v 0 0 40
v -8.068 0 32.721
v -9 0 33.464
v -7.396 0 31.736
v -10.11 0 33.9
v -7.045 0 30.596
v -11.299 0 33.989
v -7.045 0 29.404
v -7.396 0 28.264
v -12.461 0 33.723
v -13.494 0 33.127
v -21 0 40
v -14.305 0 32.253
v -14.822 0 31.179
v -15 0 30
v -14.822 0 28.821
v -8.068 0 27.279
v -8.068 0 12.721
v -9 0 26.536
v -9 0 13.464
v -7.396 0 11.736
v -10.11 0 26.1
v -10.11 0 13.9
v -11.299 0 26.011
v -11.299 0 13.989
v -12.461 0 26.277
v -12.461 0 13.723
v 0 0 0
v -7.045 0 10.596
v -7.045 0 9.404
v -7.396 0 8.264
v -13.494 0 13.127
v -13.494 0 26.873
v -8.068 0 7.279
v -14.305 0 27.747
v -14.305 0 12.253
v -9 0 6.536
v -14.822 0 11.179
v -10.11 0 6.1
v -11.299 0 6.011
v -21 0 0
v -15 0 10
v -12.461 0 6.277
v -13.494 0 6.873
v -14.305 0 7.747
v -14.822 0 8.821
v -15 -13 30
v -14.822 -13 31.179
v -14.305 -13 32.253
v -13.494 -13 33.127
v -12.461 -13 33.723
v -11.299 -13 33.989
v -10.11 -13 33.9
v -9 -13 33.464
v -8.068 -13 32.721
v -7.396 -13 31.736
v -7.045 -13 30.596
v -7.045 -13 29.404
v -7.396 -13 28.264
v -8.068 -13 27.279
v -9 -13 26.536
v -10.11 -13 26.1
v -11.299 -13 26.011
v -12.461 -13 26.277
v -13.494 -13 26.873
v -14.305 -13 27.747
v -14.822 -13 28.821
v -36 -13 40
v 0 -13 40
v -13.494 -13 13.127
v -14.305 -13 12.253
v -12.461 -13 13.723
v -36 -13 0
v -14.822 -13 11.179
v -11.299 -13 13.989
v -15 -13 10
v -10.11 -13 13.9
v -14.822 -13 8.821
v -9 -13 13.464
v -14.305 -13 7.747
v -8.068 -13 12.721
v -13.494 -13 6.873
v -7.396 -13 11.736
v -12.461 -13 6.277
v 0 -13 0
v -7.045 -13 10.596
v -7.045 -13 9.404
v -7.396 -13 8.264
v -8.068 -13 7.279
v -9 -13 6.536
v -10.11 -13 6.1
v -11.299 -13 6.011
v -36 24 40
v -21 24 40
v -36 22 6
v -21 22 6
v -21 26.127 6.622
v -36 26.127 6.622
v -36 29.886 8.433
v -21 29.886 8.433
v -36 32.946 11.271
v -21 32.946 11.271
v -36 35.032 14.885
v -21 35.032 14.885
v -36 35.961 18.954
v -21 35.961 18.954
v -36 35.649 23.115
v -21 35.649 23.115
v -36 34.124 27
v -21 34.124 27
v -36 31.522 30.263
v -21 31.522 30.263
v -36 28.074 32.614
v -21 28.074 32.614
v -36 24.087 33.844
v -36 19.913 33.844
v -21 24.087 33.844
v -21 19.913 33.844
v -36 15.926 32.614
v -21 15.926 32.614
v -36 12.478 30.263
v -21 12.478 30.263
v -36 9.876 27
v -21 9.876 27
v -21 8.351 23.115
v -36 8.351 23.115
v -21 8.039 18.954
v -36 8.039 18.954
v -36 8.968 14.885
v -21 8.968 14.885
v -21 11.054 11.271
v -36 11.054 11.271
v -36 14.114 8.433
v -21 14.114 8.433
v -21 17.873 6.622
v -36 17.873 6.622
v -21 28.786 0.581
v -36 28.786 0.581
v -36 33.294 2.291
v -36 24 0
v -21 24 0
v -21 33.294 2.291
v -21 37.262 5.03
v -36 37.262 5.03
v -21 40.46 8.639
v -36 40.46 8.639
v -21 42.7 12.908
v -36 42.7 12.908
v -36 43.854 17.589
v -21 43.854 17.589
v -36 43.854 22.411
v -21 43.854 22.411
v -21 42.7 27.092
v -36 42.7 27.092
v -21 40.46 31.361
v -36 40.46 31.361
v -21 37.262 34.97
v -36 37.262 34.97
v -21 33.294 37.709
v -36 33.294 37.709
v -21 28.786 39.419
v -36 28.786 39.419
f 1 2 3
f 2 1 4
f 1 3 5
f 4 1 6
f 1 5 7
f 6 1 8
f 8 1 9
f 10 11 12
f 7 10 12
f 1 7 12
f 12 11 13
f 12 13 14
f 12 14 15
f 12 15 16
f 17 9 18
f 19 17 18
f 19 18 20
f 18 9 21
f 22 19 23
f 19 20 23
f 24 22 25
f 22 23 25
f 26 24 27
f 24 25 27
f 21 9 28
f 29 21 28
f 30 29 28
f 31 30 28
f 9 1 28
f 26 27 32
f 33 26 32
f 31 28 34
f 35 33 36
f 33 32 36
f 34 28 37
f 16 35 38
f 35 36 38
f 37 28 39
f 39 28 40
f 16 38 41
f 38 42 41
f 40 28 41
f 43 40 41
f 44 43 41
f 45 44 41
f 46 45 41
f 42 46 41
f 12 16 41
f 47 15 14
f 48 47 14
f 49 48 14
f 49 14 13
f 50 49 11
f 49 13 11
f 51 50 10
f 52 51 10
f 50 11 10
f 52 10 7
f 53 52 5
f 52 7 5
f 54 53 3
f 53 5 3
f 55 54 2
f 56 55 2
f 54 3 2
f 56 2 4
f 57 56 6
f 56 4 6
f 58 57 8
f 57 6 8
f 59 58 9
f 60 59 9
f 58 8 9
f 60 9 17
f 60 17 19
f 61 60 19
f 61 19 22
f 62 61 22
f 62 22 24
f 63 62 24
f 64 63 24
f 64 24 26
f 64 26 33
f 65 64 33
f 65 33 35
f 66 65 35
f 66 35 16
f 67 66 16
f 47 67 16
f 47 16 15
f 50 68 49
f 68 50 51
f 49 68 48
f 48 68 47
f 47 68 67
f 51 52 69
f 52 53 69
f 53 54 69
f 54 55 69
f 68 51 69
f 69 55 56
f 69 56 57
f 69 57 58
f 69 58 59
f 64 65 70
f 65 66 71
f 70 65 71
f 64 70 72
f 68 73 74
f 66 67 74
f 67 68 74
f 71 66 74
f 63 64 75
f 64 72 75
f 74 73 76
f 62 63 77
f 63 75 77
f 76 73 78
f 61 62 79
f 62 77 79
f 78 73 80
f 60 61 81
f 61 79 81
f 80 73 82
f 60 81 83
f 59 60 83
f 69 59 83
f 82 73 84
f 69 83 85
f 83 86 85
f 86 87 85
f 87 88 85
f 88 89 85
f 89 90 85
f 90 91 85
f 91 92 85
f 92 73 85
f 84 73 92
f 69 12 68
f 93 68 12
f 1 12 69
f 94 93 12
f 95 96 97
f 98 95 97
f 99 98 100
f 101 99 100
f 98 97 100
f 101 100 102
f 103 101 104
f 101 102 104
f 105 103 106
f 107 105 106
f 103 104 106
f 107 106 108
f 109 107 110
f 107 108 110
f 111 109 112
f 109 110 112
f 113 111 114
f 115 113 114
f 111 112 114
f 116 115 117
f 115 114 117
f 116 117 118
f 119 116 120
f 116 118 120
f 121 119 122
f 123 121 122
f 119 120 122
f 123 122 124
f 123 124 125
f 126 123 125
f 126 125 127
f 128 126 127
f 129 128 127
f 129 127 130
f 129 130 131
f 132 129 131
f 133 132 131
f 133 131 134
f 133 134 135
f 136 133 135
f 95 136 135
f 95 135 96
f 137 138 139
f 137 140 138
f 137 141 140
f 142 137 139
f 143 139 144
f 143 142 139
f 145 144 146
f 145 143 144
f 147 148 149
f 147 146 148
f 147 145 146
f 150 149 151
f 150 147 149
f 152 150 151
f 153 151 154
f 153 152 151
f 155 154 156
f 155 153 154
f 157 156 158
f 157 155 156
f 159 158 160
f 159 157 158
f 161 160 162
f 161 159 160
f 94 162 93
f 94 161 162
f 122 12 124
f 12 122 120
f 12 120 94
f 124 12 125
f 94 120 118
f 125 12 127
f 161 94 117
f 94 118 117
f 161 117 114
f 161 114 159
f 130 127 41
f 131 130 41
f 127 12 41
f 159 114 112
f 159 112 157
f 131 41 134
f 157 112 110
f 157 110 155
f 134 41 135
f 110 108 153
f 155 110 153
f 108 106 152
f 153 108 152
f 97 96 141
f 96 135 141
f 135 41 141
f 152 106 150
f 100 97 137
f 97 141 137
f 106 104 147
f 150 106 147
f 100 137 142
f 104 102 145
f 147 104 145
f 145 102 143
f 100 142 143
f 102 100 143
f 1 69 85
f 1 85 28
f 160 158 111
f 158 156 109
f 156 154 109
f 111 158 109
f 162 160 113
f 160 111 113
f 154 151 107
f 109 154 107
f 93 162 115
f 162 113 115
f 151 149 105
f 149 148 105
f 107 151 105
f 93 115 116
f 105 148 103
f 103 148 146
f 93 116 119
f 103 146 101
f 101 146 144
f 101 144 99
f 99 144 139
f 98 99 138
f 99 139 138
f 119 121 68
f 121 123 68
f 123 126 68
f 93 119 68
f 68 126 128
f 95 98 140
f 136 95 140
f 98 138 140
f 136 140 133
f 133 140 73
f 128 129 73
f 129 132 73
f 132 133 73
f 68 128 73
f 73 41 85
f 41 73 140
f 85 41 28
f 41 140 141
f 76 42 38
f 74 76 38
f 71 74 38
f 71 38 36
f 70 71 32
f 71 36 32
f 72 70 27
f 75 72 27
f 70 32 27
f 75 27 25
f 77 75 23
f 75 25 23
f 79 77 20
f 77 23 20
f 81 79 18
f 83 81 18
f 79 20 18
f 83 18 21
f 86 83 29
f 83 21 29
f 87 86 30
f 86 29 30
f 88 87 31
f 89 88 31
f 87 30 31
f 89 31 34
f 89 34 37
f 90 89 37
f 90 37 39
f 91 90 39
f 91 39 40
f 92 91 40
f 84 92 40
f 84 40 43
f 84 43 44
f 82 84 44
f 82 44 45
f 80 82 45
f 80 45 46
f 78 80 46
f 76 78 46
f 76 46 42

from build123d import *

# Parameters (mm, degrees)
BOSS_EXTRUDE5_DEPTH = 40
FILLET4_RADIUS      = 20
FILLET4_LENGTH      = 15
SKETCH8_R           = 14
CUT_EXTRUDE1_DEPTH  = 40
SKETCH9_R           = 4
CUT_EXTRUDE2_DEPTH  = 40


with BuildPart() as part:
    # Sketch1 → Boss-Extrude5 (new body)
    with BuildSketch(Plane.XY):
        Polygon((-36, 44), (-36, -13), (0, -13), (0, 0), (-21, 0), (-21, 44), align=None)
    extrude(amount=BOSS_EXTRUDE5_DEPTH)

    # Fillet4: full round fillet: the end face becomes a half cylinder, R = half its width
    fillet4_face = Plane((-28.5, 44, 20), x_dir=(1, 0, 0), z_dir=(0, 1, 0))  # on the end face: x along it, z out of the body
    fillet4_slab = fillet4_face.offset(-FILLET4_RADIUS / 2) * Box(FILLET4_LENGTH, 2 * FILLET4_RADIUS, FILLET4_RADIUS, mode=Mode.PRIVATE)  # the body's end, R deep
    fillet4_round = Plane((-28.5, 24, 20), x_dir=(0, 1, 0), z_dir=(1, 0, 0)) * Cylinder(FILLET4_RADIUS, FILLET4_LENGTH, mode=Mode.PRIVATE)  # its axis R under the face
    add(fillet4_slab - fillet4_round, mode=Mode.SUBTRACT)

    # Sketch8 → Cut-Extrude1 (cut)
    with BuildSketch(Plane(origin=(-21, 0, 0), x_dir=(0, 0, -1), z_dir=(1, 0, 0))):
        with Locations((-20, 22)):
            Circle(SKETCH8_R)
    extrude(amount=-CUT_EXTRUDE1_DEPTH, mode=Mode.SUBTRACT)

    # Sketch9 → Cut-Extrude2 (cut)
    with BuildSketch(Plane(origin=(0, 0, 0), x_dir=(1, 0, 0), z_dir=(0, 1, 0))):
        with Locations(Location((-11, -10, 0), (0, 0, 180))):
            Circle(SKETCH9_R)
        with Locations(Location((-11, -30, 0), (0, 0, 180))):
            Circle(SKETCH9_R)
    extrude(amount=-CUT_EXTRUDE2_DEPTH, mode=Mode.SUBTRACT)


solid = part.part
